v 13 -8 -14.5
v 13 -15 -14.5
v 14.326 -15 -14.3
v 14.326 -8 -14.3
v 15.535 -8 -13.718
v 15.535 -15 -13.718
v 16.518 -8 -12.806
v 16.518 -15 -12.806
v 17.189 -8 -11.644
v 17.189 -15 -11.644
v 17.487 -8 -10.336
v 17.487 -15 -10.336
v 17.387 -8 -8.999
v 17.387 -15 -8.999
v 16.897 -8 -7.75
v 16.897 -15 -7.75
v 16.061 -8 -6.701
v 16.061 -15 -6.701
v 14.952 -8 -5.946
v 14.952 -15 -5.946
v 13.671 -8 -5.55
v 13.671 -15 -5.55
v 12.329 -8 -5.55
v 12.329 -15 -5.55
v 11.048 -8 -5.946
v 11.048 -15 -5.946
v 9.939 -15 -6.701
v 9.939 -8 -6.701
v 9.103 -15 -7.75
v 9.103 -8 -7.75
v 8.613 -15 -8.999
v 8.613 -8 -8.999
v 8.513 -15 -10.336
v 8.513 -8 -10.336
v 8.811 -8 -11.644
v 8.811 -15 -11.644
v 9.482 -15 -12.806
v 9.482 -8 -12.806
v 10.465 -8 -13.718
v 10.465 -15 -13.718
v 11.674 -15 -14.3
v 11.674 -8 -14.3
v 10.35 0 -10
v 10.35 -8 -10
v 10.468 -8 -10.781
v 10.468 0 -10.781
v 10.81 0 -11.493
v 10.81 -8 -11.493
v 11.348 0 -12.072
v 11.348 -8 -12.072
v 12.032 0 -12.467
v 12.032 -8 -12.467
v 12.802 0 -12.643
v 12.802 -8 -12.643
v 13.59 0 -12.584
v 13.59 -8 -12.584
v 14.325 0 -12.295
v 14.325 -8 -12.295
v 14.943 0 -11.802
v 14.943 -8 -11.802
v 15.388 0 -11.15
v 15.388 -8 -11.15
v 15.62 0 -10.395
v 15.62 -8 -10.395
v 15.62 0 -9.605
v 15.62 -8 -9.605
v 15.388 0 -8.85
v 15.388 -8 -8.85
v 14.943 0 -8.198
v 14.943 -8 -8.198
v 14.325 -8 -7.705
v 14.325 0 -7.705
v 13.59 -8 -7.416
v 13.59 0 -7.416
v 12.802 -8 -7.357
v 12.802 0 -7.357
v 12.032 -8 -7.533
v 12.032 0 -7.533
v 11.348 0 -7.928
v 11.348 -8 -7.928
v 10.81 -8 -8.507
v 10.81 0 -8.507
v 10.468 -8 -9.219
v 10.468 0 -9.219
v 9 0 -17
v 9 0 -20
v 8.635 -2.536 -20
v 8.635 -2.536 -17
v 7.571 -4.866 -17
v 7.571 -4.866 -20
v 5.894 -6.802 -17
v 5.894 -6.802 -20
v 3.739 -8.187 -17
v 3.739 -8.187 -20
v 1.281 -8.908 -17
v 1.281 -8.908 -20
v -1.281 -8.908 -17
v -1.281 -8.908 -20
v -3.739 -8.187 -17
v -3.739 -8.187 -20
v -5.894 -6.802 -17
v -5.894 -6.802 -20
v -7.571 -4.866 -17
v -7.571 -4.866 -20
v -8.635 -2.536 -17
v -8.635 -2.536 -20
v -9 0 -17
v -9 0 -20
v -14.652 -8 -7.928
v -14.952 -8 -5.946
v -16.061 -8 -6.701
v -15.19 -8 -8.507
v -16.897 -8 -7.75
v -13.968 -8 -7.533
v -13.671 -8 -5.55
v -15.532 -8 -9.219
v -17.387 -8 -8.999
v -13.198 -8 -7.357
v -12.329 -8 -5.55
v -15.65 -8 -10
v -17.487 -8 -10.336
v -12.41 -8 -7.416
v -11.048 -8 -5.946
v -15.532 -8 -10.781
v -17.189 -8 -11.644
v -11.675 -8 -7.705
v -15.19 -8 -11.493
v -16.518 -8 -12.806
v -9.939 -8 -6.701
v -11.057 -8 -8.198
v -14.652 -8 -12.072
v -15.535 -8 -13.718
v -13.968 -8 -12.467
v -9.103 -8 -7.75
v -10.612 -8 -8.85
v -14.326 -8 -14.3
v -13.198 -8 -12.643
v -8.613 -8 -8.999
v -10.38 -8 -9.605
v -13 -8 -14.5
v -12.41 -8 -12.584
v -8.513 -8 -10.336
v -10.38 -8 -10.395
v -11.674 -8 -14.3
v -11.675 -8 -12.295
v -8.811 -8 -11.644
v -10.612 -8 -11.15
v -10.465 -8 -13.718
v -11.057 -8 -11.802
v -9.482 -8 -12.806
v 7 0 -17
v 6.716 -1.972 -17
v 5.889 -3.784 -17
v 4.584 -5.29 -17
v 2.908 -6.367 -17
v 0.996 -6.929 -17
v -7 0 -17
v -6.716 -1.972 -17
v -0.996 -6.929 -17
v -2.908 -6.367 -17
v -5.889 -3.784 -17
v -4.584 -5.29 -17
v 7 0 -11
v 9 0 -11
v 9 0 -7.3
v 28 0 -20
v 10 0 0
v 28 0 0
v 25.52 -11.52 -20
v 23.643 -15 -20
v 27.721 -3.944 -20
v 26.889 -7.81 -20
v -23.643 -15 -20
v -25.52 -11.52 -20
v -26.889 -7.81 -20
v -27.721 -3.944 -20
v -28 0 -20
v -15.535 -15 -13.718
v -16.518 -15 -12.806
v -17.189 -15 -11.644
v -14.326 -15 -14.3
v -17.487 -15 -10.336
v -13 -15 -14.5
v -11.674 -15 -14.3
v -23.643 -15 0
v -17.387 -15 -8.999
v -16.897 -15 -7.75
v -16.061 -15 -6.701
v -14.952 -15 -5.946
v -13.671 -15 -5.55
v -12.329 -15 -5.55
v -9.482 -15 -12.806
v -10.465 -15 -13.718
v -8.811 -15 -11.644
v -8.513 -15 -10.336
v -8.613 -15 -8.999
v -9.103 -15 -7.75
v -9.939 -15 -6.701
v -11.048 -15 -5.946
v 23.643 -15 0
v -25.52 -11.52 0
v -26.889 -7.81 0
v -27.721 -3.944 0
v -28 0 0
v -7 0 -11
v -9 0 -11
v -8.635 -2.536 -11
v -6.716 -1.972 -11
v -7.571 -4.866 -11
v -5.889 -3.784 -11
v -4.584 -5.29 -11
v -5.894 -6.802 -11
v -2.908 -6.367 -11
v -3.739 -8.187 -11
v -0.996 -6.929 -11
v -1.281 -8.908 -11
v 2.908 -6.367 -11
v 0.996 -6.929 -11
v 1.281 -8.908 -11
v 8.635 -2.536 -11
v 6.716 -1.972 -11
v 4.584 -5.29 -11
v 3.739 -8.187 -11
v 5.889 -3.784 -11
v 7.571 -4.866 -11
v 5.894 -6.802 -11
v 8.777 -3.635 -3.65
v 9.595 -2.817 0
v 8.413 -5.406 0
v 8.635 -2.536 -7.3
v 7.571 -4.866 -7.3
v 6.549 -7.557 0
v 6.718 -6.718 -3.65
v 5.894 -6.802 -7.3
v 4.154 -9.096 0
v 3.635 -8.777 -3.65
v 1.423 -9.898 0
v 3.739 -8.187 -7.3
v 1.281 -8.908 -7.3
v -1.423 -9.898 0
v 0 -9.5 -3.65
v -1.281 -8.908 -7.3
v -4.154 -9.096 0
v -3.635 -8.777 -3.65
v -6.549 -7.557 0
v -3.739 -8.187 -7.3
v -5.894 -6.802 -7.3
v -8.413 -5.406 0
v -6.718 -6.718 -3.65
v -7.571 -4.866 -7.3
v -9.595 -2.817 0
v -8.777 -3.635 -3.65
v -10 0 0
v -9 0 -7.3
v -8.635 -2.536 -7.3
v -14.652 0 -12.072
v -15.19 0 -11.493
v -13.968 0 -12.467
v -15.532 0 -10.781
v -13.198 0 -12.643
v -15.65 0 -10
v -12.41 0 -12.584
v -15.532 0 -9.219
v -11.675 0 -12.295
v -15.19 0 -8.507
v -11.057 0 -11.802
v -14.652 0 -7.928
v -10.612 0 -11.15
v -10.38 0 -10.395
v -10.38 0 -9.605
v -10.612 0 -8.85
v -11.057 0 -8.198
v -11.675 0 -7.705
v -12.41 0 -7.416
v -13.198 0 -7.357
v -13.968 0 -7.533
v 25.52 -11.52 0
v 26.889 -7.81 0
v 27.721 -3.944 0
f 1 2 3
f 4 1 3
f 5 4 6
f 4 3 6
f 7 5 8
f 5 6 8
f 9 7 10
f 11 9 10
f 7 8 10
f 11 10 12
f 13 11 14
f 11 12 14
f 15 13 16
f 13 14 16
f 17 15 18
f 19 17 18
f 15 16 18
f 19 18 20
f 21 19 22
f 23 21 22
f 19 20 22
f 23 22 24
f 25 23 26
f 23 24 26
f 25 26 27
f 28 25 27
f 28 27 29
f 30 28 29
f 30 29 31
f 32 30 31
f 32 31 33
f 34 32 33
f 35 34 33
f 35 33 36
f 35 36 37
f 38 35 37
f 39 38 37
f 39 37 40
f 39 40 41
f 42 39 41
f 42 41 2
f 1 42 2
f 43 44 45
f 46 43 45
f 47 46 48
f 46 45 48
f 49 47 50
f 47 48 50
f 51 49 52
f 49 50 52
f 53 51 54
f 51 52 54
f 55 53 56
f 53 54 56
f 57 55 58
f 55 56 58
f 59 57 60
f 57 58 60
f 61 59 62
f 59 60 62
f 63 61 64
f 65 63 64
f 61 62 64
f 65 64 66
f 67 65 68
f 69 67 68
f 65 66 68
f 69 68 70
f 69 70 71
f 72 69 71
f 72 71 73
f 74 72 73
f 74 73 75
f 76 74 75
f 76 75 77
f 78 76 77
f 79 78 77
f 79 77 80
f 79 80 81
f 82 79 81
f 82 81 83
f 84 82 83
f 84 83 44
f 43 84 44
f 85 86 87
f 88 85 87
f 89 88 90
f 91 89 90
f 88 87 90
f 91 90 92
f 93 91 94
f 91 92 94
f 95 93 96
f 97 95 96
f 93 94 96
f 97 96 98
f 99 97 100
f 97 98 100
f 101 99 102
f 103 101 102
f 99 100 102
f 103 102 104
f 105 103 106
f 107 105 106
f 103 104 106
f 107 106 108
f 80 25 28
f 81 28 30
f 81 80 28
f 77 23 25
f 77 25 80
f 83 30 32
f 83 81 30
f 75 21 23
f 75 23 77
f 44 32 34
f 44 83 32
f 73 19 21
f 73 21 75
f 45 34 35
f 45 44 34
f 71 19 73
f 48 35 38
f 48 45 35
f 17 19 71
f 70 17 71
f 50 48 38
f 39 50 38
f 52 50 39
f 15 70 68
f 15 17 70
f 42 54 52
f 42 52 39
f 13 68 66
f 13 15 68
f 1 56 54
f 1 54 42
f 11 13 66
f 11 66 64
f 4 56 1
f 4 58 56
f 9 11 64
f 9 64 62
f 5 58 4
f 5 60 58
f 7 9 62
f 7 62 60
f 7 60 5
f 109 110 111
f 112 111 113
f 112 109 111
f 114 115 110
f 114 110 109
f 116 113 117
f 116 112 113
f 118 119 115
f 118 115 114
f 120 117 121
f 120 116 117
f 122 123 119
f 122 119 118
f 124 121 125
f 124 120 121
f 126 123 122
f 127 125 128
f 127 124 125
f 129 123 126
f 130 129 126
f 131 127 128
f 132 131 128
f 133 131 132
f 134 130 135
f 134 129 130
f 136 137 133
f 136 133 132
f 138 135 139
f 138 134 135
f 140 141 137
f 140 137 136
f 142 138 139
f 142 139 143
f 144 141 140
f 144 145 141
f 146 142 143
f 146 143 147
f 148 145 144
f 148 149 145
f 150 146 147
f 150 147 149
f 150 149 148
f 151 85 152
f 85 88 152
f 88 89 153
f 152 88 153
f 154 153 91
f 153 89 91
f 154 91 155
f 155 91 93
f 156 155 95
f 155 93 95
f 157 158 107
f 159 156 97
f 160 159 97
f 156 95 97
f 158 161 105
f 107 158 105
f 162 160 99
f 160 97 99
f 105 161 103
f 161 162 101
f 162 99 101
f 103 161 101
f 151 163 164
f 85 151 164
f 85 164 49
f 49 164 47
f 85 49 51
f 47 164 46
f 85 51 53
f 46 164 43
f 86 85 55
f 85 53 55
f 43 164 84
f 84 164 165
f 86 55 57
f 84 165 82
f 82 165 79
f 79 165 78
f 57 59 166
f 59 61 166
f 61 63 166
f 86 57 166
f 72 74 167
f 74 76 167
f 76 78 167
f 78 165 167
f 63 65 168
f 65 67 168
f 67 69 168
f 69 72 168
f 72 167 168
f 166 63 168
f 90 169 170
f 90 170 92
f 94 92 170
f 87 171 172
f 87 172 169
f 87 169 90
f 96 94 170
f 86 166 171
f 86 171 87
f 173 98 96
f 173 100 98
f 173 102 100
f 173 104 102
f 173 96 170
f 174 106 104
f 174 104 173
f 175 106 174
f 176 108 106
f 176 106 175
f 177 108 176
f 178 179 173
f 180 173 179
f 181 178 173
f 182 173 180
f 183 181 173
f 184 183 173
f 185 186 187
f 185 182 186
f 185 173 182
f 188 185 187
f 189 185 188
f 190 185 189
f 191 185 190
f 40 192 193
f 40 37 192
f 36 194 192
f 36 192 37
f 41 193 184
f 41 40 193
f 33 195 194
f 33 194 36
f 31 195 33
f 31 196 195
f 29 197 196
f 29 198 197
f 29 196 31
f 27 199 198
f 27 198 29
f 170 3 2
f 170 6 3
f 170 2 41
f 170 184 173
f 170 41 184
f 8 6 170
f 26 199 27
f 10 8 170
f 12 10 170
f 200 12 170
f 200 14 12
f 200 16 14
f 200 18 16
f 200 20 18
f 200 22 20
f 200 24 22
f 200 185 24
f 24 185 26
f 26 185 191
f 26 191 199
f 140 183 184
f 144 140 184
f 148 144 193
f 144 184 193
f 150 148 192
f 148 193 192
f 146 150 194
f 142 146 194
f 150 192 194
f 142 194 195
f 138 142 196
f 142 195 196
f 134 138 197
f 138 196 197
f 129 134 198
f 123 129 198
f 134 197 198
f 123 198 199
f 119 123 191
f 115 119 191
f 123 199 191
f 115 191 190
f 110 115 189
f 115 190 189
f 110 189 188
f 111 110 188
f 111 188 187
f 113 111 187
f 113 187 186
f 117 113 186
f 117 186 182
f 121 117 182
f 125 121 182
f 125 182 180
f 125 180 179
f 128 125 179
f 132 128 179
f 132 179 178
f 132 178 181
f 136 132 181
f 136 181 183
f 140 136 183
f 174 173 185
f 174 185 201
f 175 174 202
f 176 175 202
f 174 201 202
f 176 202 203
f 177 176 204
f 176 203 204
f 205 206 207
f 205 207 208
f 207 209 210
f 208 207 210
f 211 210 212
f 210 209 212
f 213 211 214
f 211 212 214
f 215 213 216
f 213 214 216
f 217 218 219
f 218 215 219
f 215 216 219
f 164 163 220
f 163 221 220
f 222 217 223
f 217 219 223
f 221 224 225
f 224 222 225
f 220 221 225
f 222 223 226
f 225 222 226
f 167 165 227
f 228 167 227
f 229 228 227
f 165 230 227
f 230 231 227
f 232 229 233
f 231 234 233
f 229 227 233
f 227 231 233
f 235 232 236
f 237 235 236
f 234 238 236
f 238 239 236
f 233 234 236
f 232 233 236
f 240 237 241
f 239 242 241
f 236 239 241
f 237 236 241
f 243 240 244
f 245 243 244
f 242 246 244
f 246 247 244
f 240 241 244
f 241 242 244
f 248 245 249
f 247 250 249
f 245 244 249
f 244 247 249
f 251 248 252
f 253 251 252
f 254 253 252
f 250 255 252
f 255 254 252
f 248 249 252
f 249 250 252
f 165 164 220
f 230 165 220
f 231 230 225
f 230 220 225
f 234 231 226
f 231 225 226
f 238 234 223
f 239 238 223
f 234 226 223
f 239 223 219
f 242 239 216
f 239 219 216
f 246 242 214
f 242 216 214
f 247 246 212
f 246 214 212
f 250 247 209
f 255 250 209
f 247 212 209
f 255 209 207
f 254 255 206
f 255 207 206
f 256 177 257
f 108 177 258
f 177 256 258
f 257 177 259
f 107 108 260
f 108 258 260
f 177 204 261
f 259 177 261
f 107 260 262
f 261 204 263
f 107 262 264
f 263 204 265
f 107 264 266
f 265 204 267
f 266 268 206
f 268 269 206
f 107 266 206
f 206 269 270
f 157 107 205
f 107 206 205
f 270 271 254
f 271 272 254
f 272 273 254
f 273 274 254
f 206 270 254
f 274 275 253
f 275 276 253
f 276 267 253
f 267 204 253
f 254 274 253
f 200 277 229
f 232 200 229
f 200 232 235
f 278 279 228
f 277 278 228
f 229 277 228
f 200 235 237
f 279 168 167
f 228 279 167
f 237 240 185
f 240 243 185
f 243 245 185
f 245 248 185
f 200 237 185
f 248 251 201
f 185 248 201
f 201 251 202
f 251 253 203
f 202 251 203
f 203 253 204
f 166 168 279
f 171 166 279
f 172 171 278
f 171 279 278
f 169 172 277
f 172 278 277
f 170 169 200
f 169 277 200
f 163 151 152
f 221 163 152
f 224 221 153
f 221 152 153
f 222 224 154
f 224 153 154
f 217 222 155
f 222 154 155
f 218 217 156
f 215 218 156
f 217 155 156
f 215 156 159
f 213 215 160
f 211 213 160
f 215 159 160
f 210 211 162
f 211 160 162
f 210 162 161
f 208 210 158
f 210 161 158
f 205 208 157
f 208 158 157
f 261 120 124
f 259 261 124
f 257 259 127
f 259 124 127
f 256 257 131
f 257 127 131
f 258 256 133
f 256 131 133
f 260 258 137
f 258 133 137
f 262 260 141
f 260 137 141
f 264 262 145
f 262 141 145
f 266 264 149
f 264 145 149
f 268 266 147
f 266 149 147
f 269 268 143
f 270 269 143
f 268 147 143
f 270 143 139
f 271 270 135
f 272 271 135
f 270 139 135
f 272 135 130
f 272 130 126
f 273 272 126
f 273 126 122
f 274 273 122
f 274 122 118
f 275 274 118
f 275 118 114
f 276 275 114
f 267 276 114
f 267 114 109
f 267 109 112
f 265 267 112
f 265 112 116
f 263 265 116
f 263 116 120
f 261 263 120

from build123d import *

# Parameters (mm, degrees)
BOSS_EXTRU_1_DEPTH      = 20
D_GAGEMENT_M51_D        = 5.3
D_GAGEMENT_M51_DEPTH    = 45
D_GAGEMENT_M51_TIP      = 1.59228064
ESQUISSE5_R             = 4.5
ENL_V_MAT_EXTRU_1_DEPTH = 20
ENL_V_MAT_EXTRU_2_DEPTH = 20


with BuildPart() as part:
    # Esquisse1 → Boss.-Extru.1 (new body)
    with BuildSketch(Plane.XY):
        with BuildLine():
            Line((-28, 0), (28, 0))
            ThreePointArc((28, 0), (0, -28), (-28, 0))
        make_face()
    extrude(amount=-BOSS_EXTRU_1_DEPTH)

    # Esquisse2 → Enlèvement de matière-Révolution1 (revolve, cut)
    with BuildSketch(Plane(origin=(0, 0, 0), x_dir=(1, 0, 0), z_dir=(0, 1, 0))):
        Polygon((12.15, 24), (12.15, 25), (0, 25), (0, 0), (10, 0), (9, 7.3), (9, 11), (7, 11), (7, 17), (9, 17), (9, 20), (7.25, 20), (7.25, 21.5), (9, 21.5), (9, 22.5), (7.25, 22.5), (7.25, 24), align=None)
    revolve(axis=Axis((0, 0, 0), (0, 0, -1)), mode=Mode.SUBTRACT)

    # Dégagement M51
    with Locations(Plane(origin=(0, 0, 0), x_dir=(1, 0, 0), z_dir=(0, 1, 0))):
        with Locations((-13, 10), (13, 10)):
            Hole(D_GAGEMENT_M51_D / 2, depth=D_GAGEMENT_M51_DEPTH)
            with Locations((0, 0, -(D_GAGEMENT_M51_DEPTH + D_GAGEMENT_M51_TIP / 2))):  # 118° drill point
                Cone(0, D_GAGEMENT_M51_D / 2, D_GAGEMENT_M51_TIP, mode=Mode.SUBTRACT)

    # Esquisse5 → Enlèv. mat.-Extru.1 (cut)
    with BuildSketch(Plane(origin=(0, -28, 0), x_dir=(0, 0, 1), z_dir=(0, -1, 0))):
        with Locations(Location((-10, 13, 0), (0, 0, 180))):
            Circle(ESQUISSE5_R)
        with Locations(Location((-10, -13, 0), (0, 0, 180))):
            Circle(ESQUISSE5_R)
    extrude(amount=-ENL_V_MAT_EXTRU_1_DEPTH, mode=Mode.SUBTRACT)

    # Esquisse6 → Enlèv. mat.-Extru.2 (cut)
    with BuildSketch(Plane.XY):
        with BuildLine():
            Line((-23.643180835, -15), (23.643180835, -15))
            ThreePointArc((23.643180835, -15), (0, -28), (-23.643180835, -15))
        make_face()
    extrude(amount=-ENL_V_MAT_EXTRU_2_DEPTH, mode=Mode.SUBTRACT)


solid = part.part
